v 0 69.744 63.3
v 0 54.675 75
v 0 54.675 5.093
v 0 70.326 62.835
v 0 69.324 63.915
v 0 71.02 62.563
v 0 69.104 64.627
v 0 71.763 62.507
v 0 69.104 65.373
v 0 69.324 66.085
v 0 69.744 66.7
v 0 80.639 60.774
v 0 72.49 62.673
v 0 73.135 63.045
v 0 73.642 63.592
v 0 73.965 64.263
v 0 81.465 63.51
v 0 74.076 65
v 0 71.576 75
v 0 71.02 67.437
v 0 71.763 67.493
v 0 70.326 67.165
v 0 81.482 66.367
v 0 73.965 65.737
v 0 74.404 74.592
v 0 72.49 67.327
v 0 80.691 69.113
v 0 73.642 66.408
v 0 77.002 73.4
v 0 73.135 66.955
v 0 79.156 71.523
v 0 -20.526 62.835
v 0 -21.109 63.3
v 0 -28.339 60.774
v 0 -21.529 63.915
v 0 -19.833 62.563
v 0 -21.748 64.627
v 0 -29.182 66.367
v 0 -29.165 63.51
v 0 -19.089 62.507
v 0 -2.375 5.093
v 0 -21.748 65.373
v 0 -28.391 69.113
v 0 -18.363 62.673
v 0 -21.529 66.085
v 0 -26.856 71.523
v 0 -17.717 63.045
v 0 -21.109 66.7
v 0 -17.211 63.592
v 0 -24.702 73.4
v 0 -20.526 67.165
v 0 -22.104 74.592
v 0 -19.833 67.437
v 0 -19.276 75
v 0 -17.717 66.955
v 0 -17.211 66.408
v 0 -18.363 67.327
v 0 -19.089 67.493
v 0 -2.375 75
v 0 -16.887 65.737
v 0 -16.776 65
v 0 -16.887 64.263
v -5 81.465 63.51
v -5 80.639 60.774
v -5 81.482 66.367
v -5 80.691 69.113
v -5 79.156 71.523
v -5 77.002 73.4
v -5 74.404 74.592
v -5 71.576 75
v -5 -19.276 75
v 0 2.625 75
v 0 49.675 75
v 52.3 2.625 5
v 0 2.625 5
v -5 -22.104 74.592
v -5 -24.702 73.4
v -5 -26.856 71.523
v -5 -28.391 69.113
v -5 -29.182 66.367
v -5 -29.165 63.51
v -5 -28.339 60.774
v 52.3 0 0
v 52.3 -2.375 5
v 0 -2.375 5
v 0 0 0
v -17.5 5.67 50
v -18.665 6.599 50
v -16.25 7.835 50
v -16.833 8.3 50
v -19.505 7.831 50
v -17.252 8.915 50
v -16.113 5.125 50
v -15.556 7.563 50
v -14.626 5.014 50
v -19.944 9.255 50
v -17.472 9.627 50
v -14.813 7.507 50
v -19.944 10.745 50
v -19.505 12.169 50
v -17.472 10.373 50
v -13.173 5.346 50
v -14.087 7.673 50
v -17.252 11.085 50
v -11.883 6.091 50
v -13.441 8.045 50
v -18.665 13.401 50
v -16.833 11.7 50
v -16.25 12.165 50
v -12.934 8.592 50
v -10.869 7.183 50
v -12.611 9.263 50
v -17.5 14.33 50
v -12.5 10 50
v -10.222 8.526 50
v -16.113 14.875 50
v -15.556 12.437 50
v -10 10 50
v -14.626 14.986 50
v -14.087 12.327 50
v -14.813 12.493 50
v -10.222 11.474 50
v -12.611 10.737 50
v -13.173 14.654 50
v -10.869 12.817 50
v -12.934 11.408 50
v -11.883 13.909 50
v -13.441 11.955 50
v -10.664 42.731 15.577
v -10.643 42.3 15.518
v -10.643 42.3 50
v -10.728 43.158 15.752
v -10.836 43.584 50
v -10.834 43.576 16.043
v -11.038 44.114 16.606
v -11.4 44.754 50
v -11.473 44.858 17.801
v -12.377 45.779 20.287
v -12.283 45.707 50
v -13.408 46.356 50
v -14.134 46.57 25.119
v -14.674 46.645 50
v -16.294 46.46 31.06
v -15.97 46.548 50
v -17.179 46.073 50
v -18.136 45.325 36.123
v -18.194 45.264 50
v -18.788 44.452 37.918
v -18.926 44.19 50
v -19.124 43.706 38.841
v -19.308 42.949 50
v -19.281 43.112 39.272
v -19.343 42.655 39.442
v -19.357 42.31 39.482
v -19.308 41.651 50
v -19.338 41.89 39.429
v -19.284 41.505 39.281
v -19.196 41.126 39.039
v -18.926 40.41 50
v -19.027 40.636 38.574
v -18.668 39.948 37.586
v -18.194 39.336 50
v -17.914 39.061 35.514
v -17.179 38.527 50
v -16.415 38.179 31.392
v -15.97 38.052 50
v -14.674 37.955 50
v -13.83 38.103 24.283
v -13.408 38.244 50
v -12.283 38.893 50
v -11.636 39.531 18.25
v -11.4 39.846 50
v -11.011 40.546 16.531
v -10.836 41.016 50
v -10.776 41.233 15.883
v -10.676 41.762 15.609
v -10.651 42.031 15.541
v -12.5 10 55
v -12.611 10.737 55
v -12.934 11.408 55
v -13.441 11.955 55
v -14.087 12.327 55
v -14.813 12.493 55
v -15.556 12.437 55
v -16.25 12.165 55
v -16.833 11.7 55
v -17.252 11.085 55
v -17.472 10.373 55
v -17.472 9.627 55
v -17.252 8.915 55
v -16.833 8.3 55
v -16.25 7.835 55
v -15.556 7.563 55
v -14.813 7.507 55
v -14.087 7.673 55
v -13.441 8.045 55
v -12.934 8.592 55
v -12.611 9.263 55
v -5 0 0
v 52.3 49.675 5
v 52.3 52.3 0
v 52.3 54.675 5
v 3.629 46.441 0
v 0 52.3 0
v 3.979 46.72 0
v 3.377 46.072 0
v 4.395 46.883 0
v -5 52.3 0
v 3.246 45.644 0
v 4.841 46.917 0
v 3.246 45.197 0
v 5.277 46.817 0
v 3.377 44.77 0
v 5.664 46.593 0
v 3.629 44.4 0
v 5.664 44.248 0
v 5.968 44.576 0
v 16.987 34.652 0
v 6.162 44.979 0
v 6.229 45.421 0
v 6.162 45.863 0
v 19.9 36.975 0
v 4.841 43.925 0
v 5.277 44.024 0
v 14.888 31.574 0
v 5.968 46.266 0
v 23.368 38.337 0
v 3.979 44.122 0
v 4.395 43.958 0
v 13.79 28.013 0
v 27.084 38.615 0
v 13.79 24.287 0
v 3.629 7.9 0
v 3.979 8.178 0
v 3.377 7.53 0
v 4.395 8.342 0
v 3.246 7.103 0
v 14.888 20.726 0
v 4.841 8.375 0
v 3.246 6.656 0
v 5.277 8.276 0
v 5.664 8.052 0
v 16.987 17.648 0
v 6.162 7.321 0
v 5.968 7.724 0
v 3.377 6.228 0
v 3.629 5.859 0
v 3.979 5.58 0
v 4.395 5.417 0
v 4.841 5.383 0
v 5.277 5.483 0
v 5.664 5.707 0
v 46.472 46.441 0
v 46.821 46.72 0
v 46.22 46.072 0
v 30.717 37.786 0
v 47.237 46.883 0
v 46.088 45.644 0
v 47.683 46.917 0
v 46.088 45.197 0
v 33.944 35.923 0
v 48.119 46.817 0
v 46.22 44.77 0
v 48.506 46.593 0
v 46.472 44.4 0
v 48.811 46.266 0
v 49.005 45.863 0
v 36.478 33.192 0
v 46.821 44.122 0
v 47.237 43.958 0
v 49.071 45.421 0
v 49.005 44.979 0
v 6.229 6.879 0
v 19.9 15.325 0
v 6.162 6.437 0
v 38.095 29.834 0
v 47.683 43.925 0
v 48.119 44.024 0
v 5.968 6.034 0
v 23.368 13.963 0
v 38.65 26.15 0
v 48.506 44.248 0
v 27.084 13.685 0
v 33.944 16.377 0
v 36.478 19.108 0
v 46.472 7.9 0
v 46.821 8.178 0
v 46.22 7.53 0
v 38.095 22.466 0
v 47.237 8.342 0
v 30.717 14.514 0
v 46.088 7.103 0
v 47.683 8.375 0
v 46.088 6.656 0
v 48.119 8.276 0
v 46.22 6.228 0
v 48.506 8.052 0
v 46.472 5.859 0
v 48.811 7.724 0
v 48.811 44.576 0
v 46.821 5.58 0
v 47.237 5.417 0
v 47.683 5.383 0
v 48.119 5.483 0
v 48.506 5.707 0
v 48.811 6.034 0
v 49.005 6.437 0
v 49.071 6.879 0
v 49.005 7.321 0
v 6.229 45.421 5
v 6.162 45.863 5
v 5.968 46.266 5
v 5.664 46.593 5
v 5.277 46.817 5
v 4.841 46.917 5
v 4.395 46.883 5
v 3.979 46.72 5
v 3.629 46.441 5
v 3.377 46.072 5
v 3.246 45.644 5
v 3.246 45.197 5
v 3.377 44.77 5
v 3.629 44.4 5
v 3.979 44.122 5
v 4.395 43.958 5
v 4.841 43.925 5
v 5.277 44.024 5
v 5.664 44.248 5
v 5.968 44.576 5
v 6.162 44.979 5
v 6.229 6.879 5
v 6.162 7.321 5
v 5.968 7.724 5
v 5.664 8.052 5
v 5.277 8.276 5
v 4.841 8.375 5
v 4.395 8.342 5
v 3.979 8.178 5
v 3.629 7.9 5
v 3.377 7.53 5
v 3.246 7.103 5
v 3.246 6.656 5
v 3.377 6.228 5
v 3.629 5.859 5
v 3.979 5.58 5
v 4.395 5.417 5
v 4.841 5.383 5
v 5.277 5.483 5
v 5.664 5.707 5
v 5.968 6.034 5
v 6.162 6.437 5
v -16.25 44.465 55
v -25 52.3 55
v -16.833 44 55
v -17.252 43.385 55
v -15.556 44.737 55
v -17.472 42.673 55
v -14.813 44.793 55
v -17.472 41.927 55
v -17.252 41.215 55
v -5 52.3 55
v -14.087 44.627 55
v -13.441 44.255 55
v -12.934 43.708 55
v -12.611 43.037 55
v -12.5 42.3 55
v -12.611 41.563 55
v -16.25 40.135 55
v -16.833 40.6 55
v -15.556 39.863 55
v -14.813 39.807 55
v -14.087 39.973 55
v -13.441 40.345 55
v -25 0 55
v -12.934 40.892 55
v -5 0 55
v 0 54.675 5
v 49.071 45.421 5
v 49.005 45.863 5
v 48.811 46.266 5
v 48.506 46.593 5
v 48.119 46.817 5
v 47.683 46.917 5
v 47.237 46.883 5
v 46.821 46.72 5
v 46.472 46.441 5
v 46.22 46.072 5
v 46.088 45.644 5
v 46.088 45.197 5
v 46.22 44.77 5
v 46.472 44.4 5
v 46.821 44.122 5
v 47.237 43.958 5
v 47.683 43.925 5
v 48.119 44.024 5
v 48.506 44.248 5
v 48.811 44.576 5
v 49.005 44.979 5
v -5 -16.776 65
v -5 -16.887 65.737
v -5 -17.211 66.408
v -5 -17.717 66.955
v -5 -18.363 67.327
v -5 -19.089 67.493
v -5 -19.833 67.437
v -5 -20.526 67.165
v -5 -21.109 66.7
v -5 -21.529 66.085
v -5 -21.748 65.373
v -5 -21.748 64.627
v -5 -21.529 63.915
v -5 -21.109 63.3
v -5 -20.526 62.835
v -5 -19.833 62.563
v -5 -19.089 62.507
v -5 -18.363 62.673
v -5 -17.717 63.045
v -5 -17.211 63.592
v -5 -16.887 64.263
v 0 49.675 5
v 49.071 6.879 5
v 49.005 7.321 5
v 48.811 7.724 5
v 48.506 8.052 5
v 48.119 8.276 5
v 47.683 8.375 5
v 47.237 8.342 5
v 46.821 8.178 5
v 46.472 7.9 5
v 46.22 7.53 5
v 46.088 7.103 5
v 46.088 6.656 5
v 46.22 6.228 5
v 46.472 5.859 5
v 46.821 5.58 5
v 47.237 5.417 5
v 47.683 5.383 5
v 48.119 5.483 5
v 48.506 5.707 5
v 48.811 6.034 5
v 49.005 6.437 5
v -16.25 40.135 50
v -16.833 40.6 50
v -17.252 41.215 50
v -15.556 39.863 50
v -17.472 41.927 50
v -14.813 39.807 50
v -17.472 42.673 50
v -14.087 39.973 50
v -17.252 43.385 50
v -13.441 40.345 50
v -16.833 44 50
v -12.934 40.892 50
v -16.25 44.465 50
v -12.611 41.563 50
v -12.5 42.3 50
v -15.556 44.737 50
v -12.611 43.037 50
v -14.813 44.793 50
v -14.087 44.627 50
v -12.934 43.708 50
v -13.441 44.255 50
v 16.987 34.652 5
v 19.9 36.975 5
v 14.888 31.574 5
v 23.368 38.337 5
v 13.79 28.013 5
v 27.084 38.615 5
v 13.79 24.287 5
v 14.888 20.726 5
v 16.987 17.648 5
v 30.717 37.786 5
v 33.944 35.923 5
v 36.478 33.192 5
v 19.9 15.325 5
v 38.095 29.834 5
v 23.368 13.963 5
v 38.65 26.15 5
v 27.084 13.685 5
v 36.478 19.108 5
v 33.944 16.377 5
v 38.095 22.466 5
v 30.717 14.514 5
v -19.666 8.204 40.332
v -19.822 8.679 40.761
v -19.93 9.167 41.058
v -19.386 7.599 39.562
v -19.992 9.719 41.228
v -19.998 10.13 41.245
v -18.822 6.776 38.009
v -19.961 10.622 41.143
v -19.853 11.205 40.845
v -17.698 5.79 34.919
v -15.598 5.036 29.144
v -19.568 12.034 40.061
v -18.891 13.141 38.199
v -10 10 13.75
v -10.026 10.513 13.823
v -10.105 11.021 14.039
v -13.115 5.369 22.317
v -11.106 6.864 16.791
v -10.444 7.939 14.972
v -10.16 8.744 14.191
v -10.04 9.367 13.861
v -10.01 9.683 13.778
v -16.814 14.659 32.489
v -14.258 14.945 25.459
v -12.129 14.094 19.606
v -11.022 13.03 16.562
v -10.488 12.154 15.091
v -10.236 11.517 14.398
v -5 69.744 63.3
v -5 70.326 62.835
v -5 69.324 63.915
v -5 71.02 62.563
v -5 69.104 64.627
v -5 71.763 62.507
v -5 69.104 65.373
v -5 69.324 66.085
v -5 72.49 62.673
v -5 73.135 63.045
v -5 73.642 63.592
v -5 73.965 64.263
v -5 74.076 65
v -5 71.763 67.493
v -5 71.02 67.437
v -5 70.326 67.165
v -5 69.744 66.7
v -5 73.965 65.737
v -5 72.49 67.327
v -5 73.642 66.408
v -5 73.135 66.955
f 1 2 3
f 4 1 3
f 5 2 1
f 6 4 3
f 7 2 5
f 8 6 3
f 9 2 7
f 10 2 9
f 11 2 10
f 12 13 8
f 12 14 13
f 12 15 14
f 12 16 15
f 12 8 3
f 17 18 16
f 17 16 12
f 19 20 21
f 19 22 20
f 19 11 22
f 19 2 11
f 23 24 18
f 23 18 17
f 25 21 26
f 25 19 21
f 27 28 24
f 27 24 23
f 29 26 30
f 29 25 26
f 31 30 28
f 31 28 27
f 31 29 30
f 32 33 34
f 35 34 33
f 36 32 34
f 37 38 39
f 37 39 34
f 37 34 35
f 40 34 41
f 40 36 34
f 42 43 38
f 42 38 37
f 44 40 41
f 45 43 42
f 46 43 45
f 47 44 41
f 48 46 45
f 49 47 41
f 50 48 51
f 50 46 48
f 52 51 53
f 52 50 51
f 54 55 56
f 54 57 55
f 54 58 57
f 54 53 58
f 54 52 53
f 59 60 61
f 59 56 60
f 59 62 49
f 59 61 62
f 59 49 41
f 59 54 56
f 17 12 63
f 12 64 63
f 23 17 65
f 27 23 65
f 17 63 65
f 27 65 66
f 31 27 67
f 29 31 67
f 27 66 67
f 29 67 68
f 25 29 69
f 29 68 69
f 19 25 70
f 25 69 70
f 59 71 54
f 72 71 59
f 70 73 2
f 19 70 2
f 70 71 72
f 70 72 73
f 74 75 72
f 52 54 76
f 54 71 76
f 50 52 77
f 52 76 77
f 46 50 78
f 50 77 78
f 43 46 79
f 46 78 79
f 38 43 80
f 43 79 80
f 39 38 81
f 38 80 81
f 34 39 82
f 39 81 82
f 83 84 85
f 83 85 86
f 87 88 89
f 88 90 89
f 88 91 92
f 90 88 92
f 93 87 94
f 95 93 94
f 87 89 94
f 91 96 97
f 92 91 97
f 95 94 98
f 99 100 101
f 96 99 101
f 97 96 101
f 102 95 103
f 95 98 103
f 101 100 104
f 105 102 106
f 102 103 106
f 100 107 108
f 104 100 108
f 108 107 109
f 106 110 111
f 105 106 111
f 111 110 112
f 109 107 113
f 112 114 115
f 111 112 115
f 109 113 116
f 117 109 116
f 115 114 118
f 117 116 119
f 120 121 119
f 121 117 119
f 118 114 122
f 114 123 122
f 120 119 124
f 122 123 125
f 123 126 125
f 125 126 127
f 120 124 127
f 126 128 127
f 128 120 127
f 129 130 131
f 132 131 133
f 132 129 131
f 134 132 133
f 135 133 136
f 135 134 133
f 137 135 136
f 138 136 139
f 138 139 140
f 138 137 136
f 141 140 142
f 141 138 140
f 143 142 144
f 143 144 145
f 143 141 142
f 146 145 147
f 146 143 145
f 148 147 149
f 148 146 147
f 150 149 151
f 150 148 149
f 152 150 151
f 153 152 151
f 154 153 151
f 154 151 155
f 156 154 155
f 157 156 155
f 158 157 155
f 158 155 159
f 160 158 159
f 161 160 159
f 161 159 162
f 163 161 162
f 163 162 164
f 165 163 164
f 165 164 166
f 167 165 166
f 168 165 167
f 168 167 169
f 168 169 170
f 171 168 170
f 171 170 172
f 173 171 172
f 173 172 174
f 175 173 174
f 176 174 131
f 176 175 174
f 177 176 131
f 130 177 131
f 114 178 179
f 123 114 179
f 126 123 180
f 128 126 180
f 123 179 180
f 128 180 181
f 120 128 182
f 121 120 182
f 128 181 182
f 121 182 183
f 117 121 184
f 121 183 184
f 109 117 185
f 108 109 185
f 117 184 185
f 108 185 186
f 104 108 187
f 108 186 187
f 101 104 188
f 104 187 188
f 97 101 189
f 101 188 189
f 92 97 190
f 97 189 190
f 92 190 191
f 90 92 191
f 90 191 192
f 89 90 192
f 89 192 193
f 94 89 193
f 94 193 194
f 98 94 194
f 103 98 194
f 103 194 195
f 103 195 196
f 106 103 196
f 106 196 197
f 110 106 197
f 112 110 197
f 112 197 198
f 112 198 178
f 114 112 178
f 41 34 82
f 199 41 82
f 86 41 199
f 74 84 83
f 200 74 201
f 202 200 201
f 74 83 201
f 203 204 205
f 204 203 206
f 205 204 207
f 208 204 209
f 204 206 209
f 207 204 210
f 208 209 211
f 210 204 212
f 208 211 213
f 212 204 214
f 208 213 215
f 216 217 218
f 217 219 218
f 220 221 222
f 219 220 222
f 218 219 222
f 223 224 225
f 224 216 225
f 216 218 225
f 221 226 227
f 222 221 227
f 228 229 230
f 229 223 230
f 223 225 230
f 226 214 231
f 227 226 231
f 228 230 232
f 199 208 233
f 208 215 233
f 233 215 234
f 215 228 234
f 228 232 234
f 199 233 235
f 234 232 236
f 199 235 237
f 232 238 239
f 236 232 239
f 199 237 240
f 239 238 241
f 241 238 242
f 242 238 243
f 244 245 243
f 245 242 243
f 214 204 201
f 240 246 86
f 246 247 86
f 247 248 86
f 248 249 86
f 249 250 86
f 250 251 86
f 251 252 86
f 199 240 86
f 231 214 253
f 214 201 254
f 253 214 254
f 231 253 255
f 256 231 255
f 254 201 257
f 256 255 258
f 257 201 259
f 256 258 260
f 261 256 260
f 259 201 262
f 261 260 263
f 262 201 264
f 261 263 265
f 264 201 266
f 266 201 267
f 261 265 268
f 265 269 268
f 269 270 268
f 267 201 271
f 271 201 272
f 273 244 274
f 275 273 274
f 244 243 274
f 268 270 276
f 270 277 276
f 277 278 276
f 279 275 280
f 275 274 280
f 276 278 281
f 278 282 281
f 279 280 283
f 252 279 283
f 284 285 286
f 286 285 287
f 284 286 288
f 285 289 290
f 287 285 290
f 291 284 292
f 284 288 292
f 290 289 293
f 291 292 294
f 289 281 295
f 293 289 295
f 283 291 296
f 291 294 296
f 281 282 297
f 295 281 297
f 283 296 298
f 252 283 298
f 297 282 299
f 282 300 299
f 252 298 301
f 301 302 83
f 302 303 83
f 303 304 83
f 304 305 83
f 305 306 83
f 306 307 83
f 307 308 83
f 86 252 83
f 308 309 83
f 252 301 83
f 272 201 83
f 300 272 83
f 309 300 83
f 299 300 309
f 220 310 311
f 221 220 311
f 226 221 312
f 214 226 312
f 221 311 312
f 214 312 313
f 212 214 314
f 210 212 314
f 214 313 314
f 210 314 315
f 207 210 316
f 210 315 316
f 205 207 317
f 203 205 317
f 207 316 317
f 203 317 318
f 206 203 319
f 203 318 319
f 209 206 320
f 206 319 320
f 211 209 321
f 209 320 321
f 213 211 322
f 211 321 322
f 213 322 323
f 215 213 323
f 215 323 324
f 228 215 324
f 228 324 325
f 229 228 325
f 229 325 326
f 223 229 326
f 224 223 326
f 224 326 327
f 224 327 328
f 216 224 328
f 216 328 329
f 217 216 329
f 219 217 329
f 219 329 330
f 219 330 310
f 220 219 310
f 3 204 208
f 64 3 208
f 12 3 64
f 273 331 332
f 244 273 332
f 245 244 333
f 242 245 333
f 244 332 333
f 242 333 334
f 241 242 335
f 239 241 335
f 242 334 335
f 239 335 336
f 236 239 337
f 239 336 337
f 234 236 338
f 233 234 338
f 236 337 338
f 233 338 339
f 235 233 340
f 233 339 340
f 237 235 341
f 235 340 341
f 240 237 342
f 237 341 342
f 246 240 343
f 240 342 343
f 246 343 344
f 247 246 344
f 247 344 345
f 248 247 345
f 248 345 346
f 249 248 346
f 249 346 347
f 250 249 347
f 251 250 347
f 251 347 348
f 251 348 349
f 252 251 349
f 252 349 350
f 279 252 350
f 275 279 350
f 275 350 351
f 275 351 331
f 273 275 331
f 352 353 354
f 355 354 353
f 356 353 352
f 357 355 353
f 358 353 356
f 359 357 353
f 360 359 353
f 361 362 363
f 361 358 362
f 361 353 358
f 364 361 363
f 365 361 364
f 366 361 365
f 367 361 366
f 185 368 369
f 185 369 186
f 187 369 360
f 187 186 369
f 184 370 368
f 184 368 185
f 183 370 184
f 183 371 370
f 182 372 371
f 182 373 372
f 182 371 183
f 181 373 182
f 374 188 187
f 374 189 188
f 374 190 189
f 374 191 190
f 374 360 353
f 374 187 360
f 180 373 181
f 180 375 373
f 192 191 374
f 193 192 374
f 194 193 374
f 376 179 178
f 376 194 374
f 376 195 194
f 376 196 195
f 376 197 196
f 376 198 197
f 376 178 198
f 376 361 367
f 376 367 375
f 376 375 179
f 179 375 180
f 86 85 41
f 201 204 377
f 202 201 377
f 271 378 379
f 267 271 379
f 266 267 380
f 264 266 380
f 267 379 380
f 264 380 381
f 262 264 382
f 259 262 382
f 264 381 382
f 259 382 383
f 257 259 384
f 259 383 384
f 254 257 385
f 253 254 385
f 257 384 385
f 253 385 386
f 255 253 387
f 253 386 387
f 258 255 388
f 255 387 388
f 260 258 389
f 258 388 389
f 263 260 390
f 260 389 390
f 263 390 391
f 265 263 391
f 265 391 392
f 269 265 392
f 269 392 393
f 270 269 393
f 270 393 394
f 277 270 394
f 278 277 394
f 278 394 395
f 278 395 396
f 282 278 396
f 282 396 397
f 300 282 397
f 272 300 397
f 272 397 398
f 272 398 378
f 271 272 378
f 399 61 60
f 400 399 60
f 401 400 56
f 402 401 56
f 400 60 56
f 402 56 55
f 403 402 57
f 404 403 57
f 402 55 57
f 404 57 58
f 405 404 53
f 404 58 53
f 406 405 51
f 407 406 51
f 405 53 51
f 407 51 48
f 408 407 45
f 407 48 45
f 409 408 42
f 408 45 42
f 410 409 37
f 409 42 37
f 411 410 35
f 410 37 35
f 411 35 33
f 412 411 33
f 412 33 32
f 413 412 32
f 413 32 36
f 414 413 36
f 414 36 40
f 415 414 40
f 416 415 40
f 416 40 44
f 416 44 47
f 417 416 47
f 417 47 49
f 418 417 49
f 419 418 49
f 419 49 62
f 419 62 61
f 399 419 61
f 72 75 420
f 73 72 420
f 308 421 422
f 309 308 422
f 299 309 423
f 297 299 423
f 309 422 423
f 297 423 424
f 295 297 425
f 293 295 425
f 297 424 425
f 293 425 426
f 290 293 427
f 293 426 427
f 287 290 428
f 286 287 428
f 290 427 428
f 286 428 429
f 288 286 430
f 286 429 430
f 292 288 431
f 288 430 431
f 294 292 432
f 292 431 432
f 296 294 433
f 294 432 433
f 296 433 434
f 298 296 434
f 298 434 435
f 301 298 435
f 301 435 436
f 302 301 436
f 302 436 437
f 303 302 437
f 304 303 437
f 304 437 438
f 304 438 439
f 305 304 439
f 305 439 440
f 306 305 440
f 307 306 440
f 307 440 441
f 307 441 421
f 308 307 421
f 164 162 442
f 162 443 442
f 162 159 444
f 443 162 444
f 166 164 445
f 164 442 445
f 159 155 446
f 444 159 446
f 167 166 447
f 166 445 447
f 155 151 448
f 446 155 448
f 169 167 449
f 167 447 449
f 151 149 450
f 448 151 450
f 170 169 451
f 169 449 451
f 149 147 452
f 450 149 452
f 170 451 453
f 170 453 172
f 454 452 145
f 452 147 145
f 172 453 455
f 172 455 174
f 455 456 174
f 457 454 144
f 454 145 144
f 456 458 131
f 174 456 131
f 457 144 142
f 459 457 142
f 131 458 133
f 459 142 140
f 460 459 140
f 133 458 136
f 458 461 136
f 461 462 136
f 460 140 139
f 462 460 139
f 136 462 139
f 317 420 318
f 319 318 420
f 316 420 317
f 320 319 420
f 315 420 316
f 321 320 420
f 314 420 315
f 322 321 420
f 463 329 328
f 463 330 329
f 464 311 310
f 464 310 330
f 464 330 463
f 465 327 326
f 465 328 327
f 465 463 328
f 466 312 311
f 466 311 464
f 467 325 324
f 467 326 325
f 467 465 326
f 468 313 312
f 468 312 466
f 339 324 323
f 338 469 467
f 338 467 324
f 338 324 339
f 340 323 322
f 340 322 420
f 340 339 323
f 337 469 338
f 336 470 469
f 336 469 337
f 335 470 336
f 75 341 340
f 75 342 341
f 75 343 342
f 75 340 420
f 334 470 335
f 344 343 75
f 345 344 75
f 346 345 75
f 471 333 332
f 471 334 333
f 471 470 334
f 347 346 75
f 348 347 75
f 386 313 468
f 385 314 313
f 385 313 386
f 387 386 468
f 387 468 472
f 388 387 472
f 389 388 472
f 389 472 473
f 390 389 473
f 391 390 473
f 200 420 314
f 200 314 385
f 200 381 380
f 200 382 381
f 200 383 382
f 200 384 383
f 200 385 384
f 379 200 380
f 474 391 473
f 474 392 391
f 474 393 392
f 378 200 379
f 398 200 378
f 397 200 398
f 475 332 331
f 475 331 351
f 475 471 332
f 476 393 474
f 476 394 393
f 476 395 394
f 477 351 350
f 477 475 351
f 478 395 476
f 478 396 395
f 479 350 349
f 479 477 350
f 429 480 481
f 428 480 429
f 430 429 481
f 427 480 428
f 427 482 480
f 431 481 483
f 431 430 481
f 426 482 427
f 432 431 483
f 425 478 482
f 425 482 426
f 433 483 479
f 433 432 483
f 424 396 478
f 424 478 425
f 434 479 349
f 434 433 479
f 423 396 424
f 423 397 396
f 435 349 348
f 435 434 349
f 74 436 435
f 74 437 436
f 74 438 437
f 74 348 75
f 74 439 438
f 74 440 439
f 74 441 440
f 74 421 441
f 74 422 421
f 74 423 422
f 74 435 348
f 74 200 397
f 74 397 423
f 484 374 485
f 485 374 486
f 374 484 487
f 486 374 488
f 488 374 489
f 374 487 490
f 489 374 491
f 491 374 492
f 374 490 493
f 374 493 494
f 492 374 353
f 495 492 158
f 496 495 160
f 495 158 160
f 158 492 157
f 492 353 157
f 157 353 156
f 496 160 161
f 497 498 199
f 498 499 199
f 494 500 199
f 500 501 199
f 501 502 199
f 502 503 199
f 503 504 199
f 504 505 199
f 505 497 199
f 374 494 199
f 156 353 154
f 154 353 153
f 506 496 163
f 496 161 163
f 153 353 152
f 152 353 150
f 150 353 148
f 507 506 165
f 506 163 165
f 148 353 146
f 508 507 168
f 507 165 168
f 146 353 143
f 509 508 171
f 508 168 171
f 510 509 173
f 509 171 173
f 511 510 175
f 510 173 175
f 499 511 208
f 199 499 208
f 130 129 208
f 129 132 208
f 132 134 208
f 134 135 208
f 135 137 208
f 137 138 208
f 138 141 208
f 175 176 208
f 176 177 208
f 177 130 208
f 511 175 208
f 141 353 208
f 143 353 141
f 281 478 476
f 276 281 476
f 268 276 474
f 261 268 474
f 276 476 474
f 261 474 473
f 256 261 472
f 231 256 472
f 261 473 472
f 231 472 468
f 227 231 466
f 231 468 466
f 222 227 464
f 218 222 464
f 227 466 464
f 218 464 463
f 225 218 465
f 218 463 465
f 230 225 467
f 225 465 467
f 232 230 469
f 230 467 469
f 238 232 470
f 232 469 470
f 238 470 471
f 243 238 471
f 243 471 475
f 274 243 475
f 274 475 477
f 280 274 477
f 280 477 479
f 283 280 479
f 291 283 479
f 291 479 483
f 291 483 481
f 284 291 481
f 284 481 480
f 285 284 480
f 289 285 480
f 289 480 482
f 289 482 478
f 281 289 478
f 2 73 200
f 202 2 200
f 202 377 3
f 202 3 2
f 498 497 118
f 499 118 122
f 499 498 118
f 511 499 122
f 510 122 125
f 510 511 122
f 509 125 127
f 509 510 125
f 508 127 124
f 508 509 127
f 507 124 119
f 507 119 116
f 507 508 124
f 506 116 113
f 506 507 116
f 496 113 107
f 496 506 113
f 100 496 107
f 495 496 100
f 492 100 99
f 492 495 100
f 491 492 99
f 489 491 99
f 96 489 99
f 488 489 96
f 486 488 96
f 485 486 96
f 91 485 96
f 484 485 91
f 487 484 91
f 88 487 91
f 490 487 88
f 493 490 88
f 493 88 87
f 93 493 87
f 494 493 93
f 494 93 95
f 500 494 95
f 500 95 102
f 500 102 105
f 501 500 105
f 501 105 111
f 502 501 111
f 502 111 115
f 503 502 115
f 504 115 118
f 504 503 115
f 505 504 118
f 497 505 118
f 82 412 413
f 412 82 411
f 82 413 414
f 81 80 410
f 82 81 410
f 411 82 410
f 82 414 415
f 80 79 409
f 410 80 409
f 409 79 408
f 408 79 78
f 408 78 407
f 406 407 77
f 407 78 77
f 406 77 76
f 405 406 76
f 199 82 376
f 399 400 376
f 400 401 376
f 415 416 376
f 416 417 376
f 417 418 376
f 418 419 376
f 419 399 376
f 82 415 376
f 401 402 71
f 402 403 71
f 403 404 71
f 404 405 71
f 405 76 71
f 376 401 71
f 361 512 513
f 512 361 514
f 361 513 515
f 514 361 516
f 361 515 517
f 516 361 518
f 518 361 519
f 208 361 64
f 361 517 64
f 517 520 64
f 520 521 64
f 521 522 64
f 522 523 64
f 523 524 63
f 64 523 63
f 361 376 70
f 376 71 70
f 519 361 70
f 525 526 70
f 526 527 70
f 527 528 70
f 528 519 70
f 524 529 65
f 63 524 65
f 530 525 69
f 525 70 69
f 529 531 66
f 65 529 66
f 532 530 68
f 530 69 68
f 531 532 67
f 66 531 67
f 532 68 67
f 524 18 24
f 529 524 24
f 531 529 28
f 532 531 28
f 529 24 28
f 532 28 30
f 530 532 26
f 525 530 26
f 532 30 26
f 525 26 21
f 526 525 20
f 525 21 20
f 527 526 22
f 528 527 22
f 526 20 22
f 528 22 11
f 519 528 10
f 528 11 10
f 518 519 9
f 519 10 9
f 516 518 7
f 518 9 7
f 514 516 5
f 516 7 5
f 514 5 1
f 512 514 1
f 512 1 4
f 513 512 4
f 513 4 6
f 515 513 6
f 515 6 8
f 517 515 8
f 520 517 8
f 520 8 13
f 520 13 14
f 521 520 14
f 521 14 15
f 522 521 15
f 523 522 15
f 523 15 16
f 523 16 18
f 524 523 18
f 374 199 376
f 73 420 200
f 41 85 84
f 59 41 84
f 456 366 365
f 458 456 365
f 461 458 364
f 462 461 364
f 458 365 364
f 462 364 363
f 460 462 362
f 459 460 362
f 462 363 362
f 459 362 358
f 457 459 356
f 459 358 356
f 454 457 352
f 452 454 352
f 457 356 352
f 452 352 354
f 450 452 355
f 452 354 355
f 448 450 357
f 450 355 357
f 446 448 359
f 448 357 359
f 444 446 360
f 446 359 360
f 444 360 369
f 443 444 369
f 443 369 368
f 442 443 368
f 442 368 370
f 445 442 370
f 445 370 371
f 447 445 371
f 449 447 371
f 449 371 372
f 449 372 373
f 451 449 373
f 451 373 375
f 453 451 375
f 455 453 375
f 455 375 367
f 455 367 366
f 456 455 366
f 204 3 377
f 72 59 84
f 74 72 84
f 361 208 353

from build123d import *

# Parameters (mm, degrees)
F0_W      = 52.3
F0_H      = 52.3
F1_DEPTH  = 5
F3_DEPTH  = 5
F4_W      = 52.3
F4_H      = 55
F5_DEPTH  = 20
F7_DEPTH  = 52.3
F8_R      = 5
F8_R_2    = 4.357139
F9_DEPTH  = 50
F10_R     = 2.5
F11_DEPTH = 55.001
F13_DEPTH = 52.3
F14_W     = 52.3
F14_H     = 5
F15_DEPTH = 70
F17_DEPTH = 89.648963
F18_R     = 10
F19_R     = 12.5
F19_R_2   = 1.5
F20_DEPTH = 5.001
F21_R     = 2.5
F22_DEPTH = 25.001


with BuildPart() as f1:
    # F0 (on Top) → F1 (new body)
    with BuildSketch(Plane.XY):
        with Locations((26.15, 26.15)):
            Rectangle(F0_W, F0_H)
    extrude(amount=F1_DEPTH)

    # F2 (on Right) → F3 (join)
    with BuildSketch(Plane.YZ):
        Polygon((0, 0), (52.3, 0), (87.273074, 75), (26.15, 75), (-34.973074, 75), align=None)
    extrude(amount=-F3_DEPTH)

    # F4 (on face) → F5 (join)
    with BuildSketch(Plane(origin=(-5, 0, 0), x_dir=(0, -1, 0), z_dir=(-1, 0, 0))):
        with Locations((-26.15, 27.5)):
            Rectangle(F4_W, F4_H)
    extrude(amount=F5_DEPTH)

    # F6 (on face) → F7 (cut, through all)
    with BuildSketch(Plane(origin=(0, 52.3, 0), x_dir=(-1, 0, 0), z_dir=(0, 1, 0))):
        Polygon((25, 55), (5, 0), (25, 0), align=None)
    extrude(amount=-F7_DEPTH, mode=Mode.SUBTRACT)

    # F8 (on Top) → F9 (cut)
    with BuildSketch(Plane.XY):
        with Locations((-15, 10)):
            Circle(F8_R)
        with Locations((-15, 42.3)):
            Circle(F8_R_2)
    extrude(amount=F9_DEPTH, mode=Mode.SUBTRACT)

    # F10 (on face) → F11 (cut, through all)
    with BuildSketch(Plane.XY.offset(55)):
        with Locations((-15, 42.3)):
            Circle(F10_R)
        with Locations((-15, 10)):
            Circle(F10_R)
    extrude(amount=-F11_DEPTH, mode=Mode.SUBTRACT)

    # F12 (on face) → F13 (join, through all)
    with BuildSketch(Plane.YZ.offset(52.3)):
        Polygon((0, 0), (0, 5), (-2.374889, 5), align=None)
        Polygon((54.674889, 5), (52.3, 5), (52.3, 0), align=None)
    extrude(amount=-F13_DEPTH)

    # F14 (on face) → F15 (join, through all)
    with BuildSketch(Plane.XY.offset(5)):
        with Locations((26.15, 52.174889)):
            Rectangle(F14_W, F14_H)
        with Locations((26.15, 0.125111)):
            Rectangle(F14_W, F14_H)
    extrude(amount=F15_DEPTH)

    # F16 (on face) → F17 (cut, through all)
    with BuildSketch(Plane.XZ.offset(2.374889)):
        Polygon((52.3, 75), (0, 75), (52.3, 5), align=None)
    extrude(amount=-F17_DEPTH, mode=Mode.SUBTRACT)

    # F18
    f18_edges = [f1.edges().sort_by_distance(p)[0] for p in [
        (-2.5, -34.973074, 75),
        (-2.5, 87.273074, 75),
    ]]
    fillet(f18_edges, radius=F18_R)

    # F19 (on face) → F20 (cut, through all)
    with BuildSketch(Plane.XY.offset(5)):
        with Locations((26.15, 26.15)):
            Circle(F19_R)
        with Locations((4.72885, 6.879248)):
            Circle(F19_R_2)
        with Locations((4.72885, 45.420752)):
            Circle(F19_R_2)
        with Locations((47.57115, 45.420752)):
            Circle(F19_R_2)
        with Locations((47.57115, 6.879248)):
            Circle(F19_R_2)
    extrude(amount=-F20_DEPTH, mode=Mode.SUBTRACT)

    # F21 (on face) → F22 (cut, through all)
    with BuildSketch(Plane.YZ):
        with Locations((-19.276219, 65)):
            Circle(F21_R)
        with Locations((71.576219, 65)):
            Circle(F21_R)
    extrude(amount=-F22_DEPTH, mode=Mode.SUBTRACT)


solid = f1.part
